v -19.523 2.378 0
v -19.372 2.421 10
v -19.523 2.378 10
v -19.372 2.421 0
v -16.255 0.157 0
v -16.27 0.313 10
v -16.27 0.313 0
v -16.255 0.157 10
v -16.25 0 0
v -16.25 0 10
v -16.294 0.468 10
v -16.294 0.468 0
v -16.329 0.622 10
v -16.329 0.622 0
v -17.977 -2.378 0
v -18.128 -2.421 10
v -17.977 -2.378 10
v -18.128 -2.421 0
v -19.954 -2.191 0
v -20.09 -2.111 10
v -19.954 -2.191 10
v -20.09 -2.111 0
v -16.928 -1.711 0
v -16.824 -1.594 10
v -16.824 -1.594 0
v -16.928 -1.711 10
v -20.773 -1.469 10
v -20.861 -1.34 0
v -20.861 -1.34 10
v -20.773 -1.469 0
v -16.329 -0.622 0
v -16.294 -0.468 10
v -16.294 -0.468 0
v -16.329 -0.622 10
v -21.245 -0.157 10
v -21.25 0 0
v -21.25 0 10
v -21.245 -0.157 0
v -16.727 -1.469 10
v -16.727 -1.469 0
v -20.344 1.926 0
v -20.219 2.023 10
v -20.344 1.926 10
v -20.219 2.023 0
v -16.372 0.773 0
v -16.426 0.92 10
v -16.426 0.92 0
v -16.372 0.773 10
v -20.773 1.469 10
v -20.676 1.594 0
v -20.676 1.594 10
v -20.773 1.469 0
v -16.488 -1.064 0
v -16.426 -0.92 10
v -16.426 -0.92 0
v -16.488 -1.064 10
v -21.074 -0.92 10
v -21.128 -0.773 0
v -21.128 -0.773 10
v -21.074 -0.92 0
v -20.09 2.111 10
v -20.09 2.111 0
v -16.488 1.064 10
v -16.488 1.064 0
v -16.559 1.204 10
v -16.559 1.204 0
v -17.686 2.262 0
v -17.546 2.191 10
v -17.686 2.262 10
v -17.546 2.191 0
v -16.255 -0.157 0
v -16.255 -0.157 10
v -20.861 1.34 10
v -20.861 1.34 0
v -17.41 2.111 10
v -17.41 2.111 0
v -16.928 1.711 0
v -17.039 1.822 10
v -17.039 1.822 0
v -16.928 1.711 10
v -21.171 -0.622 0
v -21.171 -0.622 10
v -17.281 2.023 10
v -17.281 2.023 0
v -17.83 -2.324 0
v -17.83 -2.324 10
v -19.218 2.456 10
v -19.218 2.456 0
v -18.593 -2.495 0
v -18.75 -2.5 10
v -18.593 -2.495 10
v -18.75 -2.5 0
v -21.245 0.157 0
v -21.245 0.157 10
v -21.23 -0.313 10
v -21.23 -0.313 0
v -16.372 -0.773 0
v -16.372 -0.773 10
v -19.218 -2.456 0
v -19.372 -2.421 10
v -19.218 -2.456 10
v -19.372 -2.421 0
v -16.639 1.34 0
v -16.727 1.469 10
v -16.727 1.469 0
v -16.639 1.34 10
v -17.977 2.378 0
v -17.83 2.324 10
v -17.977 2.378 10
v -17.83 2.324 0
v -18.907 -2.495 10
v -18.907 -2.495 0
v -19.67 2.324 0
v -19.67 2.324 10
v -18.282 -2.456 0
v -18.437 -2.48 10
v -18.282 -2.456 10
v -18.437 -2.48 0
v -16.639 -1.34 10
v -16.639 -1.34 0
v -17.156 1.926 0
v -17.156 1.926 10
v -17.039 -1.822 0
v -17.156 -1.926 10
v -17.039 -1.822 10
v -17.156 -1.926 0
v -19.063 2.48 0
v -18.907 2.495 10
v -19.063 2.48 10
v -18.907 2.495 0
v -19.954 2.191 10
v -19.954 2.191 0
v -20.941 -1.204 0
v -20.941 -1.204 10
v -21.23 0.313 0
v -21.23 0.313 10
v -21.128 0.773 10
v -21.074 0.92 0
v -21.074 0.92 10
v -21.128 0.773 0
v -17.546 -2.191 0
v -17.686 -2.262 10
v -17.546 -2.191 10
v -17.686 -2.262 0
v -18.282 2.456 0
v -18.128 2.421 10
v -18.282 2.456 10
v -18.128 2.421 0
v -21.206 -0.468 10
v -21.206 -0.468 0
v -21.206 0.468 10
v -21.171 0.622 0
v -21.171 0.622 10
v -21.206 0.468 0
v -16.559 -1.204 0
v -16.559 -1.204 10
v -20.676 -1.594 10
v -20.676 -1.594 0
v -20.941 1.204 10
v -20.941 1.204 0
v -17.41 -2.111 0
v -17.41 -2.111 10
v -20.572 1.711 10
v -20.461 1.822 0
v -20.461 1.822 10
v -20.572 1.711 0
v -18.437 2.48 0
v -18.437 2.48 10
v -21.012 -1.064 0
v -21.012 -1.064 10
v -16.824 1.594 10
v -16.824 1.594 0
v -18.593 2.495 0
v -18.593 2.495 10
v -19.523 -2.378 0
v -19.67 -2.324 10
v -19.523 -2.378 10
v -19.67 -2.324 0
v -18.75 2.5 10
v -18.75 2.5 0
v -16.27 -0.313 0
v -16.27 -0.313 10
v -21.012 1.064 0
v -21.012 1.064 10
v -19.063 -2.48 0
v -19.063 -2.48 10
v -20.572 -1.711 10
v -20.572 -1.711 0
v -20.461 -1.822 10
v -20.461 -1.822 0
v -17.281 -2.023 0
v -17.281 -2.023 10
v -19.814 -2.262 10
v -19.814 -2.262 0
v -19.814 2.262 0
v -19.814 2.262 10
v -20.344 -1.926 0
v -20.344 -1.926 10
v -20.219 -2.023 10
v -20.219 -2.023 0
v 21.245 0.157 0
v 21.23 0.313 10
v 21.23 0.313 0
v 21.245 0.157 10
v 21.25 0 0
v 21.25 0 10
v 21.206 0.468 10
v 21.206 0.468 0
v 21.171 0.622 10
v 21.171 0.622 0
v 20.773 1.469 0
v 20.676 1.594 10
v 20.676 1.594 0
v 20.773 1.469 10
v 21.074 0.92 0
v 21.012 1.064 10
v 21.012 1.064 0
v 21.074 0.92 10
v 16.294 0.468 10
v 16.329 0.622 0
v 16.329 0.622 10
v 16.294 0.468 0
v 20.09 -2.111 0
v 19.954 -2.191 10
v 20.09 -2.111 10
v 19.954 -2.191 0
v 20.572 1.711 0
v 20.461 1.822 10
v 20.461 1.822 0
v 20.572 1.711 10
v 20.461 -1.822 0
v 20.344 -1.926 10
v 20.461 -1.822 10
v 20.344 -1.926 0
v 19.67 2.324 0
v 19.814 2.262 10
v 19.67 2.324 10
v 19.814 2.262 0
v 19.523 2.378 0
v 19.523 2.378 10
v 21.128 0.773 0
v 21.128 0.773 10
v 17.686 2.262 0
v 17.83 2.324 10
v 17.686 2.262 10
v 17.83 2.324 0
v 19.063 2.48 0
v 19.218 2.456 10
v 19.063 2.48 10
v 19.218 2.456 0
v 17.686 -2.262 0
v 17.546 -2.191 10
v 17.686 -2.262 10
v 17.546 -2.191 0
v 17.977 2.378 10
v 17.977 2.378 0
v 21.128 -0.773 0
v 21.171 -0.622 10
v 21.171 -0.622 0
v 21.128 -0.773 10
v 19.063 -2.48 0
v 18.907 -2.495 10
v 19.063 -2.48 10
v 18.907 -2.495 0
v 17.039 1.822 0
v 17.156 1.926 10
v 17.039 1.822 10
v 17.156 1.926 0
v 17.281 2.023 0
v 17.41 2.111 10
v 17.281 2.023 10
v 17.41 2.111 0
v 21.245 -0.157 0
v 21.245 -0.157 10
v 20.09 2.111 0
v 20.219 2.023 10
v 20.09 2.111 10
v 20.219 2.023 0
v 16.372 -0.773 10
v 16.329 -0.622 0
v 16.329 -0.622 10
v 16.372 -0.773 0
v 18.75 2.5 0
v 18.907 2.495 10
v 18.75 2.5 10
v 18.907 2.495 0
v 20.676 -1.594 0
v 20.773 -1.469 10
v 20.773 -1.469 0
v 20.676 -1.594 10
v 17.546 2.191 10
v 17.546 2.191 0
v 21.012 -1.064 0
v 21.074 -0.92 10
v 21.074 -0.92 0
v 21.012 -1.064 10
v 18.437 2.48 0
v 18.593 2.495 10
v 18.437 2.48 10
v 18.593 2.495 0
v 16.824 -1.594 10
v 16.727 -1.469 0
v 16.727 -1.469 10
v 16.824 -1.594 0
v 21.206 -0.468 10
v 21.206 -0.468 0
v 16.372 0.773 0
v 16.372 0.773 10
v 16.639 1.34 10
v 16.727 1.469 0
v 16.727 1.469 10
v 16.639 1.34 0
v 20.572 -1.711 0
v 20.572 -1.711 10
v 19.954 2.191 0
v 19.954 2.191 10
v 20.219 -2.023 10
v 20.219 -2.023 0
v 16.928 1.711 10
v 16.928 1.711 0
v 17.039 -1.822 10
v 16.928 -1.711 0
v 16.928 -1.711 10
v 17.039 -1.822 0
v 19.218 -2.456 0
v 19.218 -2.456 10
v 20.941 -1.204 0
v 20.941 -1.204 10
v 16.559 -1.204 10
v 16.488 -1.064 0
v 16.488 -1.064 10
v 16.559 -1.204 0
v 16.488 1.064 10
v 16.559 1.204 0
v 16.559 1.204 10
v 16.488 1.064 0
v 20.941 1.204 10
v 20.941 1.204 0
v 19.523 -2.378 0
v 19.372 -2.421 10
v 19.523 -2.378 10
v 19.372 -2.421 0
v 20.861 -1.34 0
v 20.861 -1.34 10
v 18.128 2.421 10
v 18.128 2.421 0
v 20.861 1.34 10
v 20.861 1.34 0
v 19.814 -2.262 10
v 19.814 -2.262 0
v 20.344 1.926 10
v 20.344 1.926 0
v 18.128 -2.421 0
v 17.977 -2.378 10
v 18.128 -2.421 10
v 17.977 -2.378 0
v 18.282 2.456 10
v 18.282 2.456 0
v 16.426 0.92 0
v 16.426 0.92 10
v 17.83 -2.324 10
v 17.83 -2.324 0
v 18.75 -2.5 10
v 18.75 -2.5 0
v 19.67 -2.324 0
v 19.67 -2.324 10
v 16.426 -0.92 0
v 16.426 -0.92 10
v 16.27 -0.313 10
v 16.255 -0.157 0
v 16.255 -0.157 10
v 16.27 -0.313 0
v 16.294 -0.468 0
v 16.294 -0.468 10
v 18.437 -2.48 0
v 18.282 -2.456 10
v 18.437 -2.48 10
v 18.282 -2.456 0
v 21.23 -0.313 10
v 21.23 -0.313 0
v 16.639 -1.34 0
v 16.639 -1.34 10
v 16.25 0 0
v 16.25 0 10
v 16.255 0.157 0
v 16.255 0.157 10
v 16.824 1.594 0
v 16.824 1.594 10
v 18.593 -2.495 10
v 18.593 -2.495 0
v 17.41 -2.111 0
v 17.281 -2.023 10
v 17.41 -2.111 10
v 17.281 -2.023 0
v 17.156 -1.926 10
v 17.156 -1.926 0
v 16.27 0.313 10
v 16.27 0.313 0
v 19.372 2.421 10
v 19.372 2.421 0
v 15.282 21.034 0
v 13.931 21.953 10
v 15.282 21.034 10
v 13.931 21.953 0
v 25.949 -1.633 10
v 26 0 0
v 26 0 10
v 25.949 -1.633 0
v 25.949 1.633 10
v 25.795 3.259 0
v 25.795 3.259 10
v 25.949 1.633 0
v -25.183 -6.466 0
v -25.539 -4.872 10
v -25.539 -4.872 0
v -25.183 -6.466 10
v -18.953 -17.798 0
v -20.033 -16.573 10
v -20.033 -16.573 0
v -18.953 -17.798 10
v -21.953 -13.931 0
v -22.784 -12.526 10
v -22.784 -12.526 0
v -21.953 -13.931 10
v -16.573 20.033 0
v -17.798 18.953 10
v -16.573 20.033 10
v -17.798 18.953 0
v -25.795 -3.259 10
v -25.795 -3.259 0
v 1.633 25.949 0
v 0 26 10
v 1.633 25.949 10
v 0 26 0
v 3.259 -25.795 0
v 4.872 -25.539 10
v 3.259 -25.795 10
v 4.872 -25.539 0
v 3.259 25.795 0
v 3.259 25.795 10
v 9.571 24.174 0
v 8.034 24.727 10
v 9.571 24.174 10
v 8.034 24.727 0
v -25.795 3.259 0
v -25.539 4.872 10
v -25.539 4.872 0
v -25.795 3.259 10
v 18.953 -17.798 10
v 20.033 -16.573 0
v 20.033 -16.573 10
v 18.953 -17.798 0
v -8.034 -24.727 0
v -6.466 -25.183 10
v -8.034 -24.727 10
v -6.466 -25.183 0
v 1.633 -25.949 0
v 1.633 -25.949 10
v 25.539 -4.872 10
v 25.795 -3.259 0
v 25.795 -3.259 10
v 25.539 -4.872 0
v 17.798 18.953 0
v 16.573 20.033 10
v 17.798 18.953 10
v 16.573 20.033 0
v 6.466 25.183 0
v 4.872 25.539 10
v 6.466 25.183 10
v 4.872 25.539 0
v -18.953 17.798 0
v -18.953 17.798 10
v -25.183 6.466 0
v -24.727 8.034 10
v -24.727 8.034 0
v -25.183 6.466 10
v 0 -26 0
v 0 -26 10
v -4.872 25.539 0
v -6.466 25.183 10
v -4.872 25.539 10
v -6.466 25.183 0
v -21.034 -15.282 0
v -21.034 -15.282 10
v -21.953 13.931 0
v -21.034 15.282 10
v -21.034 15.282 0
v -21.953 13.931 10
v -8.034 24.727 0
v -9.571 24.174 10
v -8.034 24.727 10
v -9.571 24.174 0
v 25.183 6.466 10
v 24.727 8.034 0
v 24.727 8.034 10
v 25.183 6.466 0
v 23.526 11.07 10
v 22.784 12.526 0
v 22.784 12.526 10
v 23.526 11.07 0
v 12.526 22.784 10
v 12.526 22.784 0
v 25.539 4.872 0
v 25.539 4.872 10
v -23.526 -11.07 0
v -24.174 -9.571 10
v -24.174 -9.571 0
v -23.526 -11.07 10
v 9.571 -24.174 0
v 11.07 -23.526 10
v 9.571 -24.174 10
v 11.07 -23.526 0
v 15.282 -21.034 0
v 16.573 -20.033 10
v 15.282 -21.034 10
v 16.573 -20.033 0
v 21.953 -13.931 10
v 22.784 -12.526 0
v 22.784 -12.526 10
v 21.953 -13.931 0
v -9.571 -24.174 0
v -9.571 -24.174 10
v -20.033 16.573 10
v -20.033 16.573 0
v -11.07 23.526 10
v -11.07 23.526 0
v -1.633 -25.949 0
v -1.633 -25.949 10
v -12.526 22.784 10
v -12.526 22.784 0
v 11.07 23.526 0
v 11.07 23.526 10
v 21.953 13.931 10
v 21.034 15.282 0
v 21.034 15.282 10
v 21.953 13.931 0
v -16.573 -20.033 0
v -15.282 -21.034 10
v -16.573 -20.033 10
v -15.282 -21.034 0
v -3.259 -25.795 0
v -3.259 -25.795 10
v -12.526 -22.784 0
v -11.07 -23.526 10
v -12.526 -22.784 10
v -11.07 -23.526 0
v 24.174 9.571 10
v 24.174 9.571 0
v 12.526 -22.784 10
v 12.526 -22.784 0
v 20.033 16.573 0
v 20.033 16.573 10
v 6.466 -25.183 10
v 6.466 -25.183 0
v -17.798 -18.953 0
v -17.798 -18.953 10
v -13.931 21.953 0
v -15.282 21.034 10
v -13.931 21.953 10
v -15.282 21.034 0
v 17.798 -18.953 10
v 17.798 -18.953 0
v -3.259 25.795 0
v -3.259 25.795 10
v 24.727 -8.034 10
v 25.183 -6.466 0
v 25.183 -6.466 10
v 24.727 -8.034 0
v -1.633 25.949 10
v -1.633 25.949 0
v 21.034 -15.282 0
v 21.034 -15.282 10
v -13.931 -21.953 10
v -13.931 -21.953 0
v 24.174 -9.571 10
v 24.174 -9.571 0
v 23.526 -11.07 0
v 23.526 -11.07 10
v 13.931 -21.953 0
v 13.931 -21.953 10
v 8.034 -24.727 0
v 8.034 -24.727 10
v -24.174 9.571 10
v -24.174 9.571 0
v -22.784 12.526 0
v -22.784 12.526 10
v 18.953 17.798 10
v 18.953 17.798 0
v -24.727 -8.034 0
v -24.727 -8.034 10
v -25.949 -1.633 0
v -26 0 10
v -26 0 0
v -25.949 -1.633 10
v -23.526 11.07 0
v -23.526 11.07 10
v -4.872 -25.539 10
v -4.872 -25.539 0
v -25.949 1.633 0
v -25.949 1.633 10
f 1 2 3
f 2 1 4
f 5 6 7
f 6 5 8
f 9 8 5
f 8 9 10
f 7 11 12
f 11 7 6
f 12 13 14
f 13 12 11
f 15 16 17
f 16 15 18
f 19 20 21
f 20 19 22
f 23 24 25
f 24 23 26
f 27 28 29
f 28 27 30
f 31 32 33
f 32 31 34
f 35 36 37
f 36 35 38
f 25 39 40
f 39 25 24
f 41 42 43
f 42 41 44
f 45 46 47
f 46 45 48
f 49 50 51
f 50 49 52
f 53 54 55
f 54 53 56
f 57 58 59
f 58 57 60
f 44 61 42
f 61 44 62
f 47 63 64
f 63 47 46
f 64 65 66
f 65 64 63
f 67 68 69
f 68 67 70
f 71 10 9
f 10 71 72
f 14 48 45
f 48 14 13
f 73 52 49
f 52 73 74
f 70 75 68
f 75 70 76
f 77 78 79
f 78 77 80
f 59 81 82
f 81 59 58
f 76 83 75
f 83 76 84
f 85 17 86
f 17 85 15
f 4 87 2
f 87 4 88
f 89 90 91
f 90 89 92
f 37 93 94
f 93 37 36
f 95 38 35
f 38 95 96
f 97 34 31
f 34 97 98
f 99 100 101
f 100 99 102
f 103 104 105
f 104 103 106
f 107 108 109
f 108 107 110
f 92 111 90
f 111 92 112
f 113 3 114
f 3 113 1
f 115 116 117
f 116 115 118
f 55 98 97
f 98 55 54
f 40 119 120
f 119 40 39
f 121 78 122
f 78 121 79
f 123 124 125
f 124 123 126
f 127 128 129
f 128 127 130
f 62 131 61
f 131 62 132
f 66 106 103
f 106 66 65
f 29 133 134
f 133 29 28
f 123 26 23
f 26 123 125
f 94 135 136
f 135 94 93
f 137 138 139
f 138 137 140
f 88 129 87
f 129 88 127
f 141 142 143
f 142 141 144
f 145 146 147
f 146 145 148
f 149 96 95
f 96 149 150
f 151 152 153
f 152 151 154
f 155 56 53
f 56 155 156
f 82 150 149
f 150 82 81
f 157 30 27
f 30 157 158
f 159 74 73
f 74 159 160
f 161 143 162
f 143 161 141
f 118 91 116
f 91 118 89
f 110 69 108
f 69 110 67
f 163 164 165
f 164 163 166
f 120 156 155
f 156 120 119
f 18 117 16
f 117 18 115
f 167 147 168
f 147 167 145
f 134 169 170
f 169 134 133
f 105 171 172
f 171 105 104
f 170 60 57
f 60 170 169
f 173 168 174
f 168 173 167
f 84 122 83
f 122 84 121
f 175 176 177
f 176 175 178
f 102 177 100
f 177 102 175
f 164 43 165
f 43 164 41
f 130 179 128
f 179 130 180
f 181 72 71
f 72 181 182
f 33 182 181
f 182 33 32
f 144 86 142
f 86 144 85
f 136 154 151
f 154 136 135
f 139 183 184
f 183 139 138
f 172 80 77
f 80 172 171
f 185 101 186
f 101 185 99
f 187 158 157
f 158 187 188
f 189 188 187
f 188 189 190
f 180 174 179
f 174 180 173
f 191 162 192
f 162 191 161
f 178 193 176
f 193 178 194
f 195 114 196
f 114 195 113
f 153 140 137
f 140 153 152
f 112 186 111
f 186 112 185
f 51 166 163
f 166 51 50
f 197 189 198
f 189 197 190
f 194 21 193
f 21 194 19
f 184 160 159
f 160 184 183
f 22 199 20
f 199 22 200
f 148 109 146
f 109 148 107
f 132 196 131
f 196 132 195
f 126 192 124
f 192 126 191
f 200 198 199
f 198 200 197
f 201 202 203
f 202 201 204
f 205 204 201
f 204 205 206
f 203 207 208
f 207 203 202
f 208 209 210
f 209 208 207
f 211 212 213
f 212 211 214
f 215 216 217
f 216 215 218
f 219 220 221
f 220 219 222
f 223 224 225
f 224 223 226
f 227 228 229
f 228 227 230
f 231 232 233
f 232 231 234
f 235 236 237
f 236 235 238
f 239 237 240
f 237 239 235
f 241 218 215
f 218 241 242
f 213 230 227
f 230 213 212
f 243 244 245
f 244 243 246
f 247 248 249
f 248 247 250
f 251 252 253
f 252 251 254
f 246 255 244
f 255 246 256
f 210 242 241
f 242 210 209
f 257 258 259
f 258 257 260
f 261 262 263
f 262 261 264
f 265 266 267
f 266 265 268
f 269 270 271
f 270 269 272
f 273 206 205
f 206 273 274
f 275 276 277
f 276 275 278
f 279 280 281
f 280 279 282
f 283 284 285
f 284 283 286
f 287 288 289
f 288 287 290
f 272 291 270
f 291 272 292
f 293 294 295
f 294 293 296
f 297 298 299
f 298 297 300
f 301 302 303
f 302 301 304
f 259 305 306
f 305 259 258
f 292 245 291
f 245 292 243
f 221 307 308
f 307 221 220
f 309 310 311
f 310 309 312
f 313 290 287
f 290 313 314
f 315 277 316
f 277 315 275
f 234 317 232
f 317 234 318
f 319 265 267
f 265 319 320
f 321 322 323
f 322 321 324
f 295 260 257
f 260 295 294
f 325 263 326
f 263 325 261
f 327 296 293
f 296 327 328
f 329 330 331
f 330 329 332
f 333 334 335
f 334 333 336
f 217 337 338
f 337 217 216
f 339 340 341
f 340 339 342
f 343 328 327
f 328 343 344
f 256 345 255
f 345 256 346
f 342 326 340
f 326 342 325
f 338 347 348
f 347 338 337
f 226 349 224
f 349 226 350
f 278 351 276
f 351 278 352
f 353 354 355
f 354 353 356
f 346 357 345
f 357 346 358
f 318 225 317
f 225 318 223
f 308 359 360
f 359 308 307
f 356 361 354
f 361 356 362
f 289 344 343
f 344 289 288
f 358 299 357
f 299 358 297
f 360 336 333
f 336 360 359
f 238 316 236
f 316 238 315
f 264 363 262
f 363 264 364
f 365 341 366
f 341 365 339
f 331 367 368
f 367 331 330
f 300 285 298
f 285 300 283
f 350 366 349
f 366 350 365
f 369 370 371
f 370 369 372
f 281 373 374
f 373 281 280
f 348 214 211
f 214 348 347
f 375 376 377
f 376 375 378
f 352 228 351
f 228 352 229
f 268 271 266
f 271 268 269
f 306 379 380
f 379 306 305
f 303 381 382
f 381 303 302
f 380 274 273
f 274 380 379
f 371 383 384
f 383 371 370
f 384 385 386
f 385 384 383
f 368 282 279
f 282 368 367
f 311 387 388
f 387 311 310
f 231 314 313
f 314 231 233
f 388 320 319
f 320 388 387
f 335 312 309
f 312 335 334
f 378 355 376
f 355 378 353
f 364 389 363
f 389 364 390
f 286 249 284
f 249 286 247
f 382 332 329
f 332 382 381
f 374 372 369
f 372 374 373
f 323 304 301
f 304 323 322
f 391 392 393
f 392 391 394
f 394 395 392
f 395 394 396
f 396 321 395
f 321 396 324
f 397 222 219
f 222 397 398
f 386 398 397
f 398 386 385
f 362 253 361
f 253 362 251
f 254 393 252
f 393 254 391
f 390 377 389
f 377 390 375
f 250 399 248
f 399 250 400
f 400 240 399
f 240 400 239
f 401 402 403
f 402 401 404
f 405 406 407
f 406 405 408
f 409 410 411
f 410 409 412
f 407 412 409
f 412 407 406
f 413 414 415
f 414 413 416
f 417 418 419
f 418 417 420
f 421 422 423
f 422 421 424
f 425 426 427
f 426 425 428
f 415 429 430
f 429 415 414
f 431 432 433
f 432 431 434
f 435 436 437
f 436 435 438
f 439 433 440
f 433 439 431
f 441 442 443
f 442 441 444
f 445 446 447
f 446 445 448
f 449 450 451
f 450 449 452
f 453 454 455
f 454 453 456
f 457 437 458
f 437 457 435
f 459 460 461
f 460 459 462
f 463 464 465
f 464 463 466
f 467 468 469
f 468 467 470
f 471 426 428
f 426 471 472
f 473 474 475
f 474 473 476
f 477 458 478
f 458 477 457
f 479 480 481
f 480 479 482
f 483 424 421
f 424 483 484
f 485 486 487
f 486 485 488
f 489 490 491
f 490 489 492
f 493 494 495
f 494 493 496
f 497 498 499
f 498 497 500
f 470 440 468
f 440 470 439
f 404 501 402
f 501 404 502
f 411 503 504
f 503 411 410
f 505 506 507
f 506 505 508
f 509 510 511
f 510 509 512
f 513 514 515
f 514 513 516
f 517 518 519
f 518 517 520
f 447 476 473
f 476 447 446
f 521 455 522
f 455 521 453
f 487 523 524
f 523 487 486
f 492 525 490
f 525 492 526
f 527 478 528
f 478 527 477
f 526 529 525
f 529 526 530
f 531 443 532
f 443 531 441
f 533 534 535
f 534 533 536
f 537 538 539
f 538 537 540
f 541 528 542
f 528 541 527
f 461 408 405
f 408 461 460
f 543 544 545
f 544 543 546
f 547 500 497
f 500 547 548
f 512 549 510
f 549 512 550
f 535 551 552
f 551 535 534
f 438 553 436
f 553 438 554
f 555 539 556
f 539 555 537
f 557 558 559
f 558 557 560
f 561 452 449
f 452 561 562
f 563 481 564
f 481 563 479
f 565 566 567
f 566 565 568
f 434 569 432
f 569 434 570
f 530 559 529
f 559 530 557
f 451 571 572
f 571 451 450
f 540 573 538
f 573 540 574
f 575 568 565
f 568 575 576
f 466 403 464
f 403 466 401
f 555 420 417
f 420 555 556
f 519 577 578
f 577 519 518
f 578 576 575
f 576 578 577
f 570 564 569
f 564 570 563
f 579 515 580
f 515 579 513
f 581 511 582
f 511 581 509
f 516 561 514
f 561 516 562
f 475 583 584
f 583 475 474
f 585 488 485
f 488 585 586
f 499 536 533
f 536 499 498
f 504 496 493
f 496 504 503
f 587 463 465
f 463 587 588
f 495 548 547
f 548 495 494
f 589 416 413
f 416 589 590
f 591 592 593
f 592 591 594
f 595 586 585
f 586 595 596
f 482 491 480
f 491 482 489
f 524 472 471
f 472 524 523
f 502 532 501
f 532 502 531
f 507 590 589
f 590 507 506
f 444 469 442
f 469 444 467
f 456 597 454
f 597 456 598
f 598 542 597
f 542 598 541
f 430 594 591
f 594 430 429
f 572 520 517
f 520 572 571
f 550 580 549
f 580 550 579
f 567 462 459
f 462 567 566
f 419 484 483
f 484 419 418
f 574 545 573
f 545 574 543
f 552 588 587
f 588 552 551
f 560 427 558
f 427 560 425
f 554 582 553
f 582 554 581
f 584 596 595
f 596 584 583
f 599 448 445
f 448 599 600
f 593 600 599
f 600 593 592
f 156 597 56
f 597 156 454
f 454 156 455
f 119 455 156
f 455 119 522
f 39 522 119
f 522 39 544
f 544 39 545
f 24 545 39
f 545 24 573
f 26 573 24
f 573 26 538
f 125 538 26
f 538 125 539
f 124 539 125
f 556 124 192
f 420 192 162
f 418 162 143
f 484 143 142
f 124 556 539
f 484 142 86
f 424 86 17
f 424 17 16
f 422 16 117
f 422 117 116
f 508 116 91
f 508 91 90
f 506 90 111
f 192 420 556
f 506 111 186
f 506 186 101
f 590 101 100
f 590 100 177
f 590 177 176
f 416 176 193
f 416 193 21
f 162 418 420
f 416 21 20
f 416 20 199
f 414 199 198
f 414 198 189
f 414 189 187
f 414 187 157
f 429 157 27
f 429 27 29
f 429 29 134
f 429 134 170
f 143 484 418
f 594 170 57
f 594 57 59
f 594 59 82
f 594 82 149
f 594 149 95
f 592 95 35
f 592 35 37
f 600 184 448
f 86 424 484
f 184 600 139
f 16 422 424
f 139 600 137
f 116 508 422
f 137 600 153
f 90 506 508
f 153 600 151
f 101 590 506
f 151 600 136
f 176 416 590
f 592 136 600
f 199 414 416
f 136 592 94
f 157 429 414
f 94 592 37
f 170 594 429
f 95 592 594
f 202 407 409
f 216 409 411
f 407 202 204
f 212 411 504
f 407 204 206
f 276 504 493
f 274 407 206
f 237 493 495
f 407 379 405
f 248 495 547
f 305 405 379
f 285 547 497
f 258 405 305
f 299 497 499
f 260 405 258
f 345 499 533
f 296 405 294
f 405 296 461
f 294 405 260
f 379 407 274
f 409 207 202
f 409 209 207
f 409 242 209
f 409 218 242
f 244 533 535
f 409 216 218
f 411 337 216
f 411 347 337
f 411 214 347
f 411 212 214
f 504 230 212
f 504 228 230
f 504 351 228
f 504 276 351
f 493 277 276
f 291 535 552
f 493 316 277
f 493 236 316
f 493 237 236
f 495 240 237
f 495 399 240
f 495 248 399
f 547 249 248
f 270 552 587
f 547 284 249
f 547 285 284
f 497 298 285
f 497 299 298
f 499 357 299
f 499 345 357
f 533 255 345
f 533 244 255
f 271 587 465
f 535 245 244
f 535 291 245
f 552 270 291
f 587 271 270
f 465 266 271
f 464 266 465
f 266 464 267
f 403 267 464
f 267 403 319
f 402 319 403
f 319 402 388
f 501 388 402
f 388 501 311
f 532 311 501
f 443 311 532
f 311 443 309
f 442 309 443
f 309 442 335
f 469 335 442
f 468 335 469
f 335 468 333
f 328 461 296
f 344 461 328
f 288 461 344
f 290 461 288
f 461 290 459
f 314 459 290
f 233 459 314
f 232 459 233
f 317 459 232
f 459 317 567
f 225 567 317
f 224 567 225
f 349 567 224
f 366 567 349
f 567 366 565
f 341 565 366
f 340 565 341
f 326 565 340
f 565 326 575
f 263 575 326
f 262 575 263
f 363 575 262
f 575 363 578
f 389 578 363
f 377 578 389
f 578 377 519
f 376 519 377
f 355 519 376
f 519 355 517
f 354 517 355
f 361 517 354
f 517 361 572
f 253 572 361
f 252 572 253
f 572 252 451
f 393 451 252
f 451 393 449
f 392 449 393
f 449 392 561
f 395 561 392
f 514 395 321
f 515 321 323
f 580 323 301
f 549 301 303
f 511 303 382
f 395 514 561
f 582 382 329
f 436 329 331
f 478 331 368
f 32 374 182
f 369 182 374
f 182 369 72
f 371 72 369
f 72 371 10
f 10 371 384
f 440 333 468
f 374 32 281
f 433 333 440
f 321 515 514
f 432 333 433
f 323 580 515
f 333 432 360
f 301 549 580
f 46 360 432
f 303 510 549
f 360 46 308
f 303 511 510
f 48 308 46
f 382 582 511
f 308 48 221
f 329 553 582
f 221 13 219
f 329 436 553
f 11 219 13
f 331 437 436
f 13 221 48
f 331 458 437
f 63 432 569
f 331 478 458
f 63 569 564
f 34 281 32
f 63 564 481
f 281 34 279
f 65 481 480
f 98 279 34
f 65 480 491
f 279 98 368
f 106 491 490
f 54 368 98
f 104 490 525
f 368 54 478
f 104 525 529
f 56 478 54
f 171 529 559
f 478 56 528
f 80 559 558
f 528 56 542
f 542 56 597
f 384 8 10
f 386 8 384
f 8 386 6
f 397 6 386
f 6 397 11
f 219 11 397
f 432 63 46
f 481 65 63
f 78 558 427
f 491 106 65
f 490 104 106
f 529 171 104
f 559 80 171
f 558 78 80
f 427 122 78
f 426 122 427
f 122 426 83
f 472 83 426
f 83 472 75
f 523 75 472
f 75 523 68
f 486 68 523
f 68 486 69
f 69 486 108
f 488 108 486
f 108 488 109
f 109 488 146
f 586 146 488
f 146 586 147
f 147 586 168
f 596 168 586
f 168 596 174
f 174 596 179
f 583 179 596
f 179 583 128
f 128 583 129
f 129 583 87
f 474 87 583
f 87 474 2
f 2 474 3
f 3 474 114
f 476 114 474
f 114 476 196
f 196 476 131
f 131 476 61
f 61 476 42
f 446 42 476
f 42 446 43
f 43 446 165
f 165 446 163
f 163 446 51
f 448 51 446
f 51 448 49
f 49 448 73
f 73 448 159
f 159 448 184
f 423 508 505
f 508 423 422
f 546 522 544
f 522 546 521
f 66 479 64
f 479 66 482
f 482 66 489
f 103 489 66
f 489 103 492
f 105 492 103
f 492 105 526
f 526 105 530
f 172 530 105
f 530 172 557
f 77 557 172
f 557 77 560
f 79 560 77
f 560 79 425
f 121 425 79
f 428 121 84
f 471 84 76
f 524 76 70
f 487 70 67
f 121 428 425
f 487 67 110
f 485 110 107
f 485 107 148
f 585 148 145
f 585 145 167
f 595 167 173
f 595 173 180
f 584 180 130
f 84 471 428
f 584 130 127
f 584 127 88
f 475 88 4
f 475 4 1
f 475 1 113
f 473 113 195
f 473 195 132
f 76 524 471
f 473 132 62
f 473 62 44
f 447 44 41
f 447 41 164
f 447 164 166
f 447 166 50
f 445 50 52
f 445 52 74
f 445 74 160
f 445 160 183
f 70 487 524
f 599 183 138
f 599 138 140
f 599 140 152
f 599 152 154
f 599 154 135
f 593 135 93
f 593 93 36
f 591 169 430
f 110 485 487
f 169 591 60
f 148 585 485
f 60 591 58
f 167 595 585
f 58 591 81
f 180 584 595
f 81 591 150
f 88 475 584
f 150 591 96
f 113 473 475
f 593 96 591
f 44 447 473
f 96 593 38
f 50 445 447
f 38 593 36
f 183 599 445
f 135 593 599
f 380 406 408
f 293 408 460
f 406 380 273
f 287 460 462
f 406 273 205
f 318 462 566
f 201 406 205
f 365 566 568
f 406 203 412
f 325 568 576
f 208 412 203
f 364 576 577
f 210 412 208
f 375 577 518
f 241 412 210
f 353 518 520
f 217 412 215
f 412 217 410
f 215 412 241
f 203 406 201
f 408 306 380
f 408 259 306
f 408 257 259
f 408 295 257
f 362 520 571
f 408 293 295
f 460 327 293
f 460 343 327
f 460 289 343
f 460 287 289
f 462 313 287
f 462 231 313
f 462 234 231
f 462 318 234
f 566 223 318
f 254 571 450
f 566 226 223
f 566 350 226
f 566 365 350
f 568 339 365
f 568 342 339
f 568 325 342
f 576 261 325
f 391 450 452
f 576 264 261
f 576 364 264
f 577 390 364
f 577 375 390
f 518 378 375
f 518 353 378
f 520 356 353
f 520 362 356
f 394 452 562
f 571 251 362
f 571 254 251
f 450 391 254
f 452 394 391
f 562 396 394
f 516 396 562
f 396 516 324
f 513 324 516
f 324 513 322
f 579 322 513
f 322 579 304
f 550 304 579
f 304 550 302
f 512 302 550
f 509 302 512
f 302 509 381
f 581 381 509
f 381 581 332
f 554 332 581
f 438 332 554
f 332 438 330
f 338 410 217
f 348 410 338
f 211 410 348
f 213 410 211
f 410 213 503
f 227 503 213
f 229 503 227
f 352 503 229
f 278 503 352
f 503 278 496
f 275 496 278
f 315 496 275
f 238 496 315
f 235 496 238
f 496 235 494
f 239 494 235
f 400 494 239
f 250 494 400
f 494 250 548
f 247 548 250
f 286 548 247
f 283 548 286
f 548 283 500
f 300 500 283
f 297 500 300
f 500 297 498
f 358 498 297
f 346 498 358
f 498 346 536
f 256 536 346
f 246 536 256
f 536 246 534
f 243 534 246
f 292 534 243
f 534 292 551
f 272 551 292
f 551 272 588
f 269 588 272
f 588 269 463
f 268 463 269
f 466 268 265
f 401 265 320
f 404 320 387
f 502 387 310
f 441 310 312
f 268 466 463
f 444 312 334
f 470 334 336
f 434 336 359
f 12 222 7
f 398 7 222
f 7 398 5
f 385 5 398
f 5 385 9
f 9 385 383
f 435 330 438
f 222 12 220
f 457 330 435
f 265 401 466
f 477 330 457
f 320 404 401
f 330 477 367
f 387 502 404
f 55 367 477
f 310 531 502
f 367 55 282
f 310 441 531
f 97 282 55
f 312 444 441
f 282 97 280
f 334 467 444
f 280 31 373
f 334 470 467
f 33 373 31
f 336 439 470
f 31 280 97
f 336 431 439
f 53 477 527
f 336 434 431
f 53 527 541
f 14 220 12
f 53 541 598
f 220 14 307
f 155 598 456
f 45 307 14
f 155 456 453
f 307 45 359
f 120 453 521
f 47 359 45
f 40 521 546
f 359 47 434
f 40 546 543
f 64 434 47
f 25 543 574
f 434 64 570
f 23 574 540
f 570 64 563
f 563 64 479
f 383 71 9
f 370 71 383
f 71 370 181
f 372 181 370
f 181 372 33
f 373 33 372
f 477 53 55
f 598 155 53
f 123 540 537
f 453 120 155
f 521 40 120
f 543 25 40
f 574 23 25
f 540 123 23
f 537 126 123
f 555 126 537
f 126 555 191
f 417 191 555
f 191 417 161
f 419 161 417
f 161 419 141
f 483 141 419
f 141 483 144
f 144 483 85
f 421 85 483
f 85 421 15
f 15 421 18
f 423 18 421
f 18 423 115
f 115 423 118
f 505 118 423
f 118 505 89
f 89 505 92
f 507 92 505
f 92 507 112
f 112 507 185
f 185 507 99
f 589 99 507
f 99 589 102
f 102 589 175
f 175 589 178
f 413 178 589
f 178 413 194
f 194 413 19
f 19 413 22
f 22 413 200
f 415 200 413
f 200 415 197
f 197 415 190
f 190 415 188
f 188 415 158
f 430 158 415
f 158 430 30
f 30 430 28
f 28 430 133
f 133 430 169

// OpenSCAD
module lock(topDiameter, bottomDiameter, height, depth) {
    distance = height - topDiameter/2 - bottomDiameter/2;

    translate([0, -topDiameter/2 + height/2, 0]) {
        cylinder(h = depth, r = topDiameter/2, $fn=100);
        
        translate([0, -distance, 0]) {
            cylinder(h = depth, r = bottomDiameter/2, $fn=100);
        }
        
        translate([-bottomDiameter/2, -distance, 0]) {
            cube([bottomDiameter, distance, depth]);
        }
    }
}


//lock(topDiameter = 17, bottomDiameter = 10, height = 32, depth=10);


module base(diameter, depth, holeD, boreHoleDistance) {
    previewOptimize=.1;
    difference() {
        cylinder(d=diameter, h=depth, center=false, $fn=100);

        translate([-boreHoleDistance/2, 0, 0]) {
            translate([0, 0, -previewOptimize]) {
                cylinder(d=holeD, h=depth+previewOptimize*2, center=false, $fn=100);
            }
            
            translate([boreHoleDistance, 0, 0]) {
                translate([0, 0, -previewOptimize]) {
                    cylinder(d=holeD, h=depth+previewOptimize*2, center=false, $fn=100);
                }
            }
        }
    }
}

base(diameter = 52, depth = 10, holeD = 5, boreHoleDistance=37.5);
